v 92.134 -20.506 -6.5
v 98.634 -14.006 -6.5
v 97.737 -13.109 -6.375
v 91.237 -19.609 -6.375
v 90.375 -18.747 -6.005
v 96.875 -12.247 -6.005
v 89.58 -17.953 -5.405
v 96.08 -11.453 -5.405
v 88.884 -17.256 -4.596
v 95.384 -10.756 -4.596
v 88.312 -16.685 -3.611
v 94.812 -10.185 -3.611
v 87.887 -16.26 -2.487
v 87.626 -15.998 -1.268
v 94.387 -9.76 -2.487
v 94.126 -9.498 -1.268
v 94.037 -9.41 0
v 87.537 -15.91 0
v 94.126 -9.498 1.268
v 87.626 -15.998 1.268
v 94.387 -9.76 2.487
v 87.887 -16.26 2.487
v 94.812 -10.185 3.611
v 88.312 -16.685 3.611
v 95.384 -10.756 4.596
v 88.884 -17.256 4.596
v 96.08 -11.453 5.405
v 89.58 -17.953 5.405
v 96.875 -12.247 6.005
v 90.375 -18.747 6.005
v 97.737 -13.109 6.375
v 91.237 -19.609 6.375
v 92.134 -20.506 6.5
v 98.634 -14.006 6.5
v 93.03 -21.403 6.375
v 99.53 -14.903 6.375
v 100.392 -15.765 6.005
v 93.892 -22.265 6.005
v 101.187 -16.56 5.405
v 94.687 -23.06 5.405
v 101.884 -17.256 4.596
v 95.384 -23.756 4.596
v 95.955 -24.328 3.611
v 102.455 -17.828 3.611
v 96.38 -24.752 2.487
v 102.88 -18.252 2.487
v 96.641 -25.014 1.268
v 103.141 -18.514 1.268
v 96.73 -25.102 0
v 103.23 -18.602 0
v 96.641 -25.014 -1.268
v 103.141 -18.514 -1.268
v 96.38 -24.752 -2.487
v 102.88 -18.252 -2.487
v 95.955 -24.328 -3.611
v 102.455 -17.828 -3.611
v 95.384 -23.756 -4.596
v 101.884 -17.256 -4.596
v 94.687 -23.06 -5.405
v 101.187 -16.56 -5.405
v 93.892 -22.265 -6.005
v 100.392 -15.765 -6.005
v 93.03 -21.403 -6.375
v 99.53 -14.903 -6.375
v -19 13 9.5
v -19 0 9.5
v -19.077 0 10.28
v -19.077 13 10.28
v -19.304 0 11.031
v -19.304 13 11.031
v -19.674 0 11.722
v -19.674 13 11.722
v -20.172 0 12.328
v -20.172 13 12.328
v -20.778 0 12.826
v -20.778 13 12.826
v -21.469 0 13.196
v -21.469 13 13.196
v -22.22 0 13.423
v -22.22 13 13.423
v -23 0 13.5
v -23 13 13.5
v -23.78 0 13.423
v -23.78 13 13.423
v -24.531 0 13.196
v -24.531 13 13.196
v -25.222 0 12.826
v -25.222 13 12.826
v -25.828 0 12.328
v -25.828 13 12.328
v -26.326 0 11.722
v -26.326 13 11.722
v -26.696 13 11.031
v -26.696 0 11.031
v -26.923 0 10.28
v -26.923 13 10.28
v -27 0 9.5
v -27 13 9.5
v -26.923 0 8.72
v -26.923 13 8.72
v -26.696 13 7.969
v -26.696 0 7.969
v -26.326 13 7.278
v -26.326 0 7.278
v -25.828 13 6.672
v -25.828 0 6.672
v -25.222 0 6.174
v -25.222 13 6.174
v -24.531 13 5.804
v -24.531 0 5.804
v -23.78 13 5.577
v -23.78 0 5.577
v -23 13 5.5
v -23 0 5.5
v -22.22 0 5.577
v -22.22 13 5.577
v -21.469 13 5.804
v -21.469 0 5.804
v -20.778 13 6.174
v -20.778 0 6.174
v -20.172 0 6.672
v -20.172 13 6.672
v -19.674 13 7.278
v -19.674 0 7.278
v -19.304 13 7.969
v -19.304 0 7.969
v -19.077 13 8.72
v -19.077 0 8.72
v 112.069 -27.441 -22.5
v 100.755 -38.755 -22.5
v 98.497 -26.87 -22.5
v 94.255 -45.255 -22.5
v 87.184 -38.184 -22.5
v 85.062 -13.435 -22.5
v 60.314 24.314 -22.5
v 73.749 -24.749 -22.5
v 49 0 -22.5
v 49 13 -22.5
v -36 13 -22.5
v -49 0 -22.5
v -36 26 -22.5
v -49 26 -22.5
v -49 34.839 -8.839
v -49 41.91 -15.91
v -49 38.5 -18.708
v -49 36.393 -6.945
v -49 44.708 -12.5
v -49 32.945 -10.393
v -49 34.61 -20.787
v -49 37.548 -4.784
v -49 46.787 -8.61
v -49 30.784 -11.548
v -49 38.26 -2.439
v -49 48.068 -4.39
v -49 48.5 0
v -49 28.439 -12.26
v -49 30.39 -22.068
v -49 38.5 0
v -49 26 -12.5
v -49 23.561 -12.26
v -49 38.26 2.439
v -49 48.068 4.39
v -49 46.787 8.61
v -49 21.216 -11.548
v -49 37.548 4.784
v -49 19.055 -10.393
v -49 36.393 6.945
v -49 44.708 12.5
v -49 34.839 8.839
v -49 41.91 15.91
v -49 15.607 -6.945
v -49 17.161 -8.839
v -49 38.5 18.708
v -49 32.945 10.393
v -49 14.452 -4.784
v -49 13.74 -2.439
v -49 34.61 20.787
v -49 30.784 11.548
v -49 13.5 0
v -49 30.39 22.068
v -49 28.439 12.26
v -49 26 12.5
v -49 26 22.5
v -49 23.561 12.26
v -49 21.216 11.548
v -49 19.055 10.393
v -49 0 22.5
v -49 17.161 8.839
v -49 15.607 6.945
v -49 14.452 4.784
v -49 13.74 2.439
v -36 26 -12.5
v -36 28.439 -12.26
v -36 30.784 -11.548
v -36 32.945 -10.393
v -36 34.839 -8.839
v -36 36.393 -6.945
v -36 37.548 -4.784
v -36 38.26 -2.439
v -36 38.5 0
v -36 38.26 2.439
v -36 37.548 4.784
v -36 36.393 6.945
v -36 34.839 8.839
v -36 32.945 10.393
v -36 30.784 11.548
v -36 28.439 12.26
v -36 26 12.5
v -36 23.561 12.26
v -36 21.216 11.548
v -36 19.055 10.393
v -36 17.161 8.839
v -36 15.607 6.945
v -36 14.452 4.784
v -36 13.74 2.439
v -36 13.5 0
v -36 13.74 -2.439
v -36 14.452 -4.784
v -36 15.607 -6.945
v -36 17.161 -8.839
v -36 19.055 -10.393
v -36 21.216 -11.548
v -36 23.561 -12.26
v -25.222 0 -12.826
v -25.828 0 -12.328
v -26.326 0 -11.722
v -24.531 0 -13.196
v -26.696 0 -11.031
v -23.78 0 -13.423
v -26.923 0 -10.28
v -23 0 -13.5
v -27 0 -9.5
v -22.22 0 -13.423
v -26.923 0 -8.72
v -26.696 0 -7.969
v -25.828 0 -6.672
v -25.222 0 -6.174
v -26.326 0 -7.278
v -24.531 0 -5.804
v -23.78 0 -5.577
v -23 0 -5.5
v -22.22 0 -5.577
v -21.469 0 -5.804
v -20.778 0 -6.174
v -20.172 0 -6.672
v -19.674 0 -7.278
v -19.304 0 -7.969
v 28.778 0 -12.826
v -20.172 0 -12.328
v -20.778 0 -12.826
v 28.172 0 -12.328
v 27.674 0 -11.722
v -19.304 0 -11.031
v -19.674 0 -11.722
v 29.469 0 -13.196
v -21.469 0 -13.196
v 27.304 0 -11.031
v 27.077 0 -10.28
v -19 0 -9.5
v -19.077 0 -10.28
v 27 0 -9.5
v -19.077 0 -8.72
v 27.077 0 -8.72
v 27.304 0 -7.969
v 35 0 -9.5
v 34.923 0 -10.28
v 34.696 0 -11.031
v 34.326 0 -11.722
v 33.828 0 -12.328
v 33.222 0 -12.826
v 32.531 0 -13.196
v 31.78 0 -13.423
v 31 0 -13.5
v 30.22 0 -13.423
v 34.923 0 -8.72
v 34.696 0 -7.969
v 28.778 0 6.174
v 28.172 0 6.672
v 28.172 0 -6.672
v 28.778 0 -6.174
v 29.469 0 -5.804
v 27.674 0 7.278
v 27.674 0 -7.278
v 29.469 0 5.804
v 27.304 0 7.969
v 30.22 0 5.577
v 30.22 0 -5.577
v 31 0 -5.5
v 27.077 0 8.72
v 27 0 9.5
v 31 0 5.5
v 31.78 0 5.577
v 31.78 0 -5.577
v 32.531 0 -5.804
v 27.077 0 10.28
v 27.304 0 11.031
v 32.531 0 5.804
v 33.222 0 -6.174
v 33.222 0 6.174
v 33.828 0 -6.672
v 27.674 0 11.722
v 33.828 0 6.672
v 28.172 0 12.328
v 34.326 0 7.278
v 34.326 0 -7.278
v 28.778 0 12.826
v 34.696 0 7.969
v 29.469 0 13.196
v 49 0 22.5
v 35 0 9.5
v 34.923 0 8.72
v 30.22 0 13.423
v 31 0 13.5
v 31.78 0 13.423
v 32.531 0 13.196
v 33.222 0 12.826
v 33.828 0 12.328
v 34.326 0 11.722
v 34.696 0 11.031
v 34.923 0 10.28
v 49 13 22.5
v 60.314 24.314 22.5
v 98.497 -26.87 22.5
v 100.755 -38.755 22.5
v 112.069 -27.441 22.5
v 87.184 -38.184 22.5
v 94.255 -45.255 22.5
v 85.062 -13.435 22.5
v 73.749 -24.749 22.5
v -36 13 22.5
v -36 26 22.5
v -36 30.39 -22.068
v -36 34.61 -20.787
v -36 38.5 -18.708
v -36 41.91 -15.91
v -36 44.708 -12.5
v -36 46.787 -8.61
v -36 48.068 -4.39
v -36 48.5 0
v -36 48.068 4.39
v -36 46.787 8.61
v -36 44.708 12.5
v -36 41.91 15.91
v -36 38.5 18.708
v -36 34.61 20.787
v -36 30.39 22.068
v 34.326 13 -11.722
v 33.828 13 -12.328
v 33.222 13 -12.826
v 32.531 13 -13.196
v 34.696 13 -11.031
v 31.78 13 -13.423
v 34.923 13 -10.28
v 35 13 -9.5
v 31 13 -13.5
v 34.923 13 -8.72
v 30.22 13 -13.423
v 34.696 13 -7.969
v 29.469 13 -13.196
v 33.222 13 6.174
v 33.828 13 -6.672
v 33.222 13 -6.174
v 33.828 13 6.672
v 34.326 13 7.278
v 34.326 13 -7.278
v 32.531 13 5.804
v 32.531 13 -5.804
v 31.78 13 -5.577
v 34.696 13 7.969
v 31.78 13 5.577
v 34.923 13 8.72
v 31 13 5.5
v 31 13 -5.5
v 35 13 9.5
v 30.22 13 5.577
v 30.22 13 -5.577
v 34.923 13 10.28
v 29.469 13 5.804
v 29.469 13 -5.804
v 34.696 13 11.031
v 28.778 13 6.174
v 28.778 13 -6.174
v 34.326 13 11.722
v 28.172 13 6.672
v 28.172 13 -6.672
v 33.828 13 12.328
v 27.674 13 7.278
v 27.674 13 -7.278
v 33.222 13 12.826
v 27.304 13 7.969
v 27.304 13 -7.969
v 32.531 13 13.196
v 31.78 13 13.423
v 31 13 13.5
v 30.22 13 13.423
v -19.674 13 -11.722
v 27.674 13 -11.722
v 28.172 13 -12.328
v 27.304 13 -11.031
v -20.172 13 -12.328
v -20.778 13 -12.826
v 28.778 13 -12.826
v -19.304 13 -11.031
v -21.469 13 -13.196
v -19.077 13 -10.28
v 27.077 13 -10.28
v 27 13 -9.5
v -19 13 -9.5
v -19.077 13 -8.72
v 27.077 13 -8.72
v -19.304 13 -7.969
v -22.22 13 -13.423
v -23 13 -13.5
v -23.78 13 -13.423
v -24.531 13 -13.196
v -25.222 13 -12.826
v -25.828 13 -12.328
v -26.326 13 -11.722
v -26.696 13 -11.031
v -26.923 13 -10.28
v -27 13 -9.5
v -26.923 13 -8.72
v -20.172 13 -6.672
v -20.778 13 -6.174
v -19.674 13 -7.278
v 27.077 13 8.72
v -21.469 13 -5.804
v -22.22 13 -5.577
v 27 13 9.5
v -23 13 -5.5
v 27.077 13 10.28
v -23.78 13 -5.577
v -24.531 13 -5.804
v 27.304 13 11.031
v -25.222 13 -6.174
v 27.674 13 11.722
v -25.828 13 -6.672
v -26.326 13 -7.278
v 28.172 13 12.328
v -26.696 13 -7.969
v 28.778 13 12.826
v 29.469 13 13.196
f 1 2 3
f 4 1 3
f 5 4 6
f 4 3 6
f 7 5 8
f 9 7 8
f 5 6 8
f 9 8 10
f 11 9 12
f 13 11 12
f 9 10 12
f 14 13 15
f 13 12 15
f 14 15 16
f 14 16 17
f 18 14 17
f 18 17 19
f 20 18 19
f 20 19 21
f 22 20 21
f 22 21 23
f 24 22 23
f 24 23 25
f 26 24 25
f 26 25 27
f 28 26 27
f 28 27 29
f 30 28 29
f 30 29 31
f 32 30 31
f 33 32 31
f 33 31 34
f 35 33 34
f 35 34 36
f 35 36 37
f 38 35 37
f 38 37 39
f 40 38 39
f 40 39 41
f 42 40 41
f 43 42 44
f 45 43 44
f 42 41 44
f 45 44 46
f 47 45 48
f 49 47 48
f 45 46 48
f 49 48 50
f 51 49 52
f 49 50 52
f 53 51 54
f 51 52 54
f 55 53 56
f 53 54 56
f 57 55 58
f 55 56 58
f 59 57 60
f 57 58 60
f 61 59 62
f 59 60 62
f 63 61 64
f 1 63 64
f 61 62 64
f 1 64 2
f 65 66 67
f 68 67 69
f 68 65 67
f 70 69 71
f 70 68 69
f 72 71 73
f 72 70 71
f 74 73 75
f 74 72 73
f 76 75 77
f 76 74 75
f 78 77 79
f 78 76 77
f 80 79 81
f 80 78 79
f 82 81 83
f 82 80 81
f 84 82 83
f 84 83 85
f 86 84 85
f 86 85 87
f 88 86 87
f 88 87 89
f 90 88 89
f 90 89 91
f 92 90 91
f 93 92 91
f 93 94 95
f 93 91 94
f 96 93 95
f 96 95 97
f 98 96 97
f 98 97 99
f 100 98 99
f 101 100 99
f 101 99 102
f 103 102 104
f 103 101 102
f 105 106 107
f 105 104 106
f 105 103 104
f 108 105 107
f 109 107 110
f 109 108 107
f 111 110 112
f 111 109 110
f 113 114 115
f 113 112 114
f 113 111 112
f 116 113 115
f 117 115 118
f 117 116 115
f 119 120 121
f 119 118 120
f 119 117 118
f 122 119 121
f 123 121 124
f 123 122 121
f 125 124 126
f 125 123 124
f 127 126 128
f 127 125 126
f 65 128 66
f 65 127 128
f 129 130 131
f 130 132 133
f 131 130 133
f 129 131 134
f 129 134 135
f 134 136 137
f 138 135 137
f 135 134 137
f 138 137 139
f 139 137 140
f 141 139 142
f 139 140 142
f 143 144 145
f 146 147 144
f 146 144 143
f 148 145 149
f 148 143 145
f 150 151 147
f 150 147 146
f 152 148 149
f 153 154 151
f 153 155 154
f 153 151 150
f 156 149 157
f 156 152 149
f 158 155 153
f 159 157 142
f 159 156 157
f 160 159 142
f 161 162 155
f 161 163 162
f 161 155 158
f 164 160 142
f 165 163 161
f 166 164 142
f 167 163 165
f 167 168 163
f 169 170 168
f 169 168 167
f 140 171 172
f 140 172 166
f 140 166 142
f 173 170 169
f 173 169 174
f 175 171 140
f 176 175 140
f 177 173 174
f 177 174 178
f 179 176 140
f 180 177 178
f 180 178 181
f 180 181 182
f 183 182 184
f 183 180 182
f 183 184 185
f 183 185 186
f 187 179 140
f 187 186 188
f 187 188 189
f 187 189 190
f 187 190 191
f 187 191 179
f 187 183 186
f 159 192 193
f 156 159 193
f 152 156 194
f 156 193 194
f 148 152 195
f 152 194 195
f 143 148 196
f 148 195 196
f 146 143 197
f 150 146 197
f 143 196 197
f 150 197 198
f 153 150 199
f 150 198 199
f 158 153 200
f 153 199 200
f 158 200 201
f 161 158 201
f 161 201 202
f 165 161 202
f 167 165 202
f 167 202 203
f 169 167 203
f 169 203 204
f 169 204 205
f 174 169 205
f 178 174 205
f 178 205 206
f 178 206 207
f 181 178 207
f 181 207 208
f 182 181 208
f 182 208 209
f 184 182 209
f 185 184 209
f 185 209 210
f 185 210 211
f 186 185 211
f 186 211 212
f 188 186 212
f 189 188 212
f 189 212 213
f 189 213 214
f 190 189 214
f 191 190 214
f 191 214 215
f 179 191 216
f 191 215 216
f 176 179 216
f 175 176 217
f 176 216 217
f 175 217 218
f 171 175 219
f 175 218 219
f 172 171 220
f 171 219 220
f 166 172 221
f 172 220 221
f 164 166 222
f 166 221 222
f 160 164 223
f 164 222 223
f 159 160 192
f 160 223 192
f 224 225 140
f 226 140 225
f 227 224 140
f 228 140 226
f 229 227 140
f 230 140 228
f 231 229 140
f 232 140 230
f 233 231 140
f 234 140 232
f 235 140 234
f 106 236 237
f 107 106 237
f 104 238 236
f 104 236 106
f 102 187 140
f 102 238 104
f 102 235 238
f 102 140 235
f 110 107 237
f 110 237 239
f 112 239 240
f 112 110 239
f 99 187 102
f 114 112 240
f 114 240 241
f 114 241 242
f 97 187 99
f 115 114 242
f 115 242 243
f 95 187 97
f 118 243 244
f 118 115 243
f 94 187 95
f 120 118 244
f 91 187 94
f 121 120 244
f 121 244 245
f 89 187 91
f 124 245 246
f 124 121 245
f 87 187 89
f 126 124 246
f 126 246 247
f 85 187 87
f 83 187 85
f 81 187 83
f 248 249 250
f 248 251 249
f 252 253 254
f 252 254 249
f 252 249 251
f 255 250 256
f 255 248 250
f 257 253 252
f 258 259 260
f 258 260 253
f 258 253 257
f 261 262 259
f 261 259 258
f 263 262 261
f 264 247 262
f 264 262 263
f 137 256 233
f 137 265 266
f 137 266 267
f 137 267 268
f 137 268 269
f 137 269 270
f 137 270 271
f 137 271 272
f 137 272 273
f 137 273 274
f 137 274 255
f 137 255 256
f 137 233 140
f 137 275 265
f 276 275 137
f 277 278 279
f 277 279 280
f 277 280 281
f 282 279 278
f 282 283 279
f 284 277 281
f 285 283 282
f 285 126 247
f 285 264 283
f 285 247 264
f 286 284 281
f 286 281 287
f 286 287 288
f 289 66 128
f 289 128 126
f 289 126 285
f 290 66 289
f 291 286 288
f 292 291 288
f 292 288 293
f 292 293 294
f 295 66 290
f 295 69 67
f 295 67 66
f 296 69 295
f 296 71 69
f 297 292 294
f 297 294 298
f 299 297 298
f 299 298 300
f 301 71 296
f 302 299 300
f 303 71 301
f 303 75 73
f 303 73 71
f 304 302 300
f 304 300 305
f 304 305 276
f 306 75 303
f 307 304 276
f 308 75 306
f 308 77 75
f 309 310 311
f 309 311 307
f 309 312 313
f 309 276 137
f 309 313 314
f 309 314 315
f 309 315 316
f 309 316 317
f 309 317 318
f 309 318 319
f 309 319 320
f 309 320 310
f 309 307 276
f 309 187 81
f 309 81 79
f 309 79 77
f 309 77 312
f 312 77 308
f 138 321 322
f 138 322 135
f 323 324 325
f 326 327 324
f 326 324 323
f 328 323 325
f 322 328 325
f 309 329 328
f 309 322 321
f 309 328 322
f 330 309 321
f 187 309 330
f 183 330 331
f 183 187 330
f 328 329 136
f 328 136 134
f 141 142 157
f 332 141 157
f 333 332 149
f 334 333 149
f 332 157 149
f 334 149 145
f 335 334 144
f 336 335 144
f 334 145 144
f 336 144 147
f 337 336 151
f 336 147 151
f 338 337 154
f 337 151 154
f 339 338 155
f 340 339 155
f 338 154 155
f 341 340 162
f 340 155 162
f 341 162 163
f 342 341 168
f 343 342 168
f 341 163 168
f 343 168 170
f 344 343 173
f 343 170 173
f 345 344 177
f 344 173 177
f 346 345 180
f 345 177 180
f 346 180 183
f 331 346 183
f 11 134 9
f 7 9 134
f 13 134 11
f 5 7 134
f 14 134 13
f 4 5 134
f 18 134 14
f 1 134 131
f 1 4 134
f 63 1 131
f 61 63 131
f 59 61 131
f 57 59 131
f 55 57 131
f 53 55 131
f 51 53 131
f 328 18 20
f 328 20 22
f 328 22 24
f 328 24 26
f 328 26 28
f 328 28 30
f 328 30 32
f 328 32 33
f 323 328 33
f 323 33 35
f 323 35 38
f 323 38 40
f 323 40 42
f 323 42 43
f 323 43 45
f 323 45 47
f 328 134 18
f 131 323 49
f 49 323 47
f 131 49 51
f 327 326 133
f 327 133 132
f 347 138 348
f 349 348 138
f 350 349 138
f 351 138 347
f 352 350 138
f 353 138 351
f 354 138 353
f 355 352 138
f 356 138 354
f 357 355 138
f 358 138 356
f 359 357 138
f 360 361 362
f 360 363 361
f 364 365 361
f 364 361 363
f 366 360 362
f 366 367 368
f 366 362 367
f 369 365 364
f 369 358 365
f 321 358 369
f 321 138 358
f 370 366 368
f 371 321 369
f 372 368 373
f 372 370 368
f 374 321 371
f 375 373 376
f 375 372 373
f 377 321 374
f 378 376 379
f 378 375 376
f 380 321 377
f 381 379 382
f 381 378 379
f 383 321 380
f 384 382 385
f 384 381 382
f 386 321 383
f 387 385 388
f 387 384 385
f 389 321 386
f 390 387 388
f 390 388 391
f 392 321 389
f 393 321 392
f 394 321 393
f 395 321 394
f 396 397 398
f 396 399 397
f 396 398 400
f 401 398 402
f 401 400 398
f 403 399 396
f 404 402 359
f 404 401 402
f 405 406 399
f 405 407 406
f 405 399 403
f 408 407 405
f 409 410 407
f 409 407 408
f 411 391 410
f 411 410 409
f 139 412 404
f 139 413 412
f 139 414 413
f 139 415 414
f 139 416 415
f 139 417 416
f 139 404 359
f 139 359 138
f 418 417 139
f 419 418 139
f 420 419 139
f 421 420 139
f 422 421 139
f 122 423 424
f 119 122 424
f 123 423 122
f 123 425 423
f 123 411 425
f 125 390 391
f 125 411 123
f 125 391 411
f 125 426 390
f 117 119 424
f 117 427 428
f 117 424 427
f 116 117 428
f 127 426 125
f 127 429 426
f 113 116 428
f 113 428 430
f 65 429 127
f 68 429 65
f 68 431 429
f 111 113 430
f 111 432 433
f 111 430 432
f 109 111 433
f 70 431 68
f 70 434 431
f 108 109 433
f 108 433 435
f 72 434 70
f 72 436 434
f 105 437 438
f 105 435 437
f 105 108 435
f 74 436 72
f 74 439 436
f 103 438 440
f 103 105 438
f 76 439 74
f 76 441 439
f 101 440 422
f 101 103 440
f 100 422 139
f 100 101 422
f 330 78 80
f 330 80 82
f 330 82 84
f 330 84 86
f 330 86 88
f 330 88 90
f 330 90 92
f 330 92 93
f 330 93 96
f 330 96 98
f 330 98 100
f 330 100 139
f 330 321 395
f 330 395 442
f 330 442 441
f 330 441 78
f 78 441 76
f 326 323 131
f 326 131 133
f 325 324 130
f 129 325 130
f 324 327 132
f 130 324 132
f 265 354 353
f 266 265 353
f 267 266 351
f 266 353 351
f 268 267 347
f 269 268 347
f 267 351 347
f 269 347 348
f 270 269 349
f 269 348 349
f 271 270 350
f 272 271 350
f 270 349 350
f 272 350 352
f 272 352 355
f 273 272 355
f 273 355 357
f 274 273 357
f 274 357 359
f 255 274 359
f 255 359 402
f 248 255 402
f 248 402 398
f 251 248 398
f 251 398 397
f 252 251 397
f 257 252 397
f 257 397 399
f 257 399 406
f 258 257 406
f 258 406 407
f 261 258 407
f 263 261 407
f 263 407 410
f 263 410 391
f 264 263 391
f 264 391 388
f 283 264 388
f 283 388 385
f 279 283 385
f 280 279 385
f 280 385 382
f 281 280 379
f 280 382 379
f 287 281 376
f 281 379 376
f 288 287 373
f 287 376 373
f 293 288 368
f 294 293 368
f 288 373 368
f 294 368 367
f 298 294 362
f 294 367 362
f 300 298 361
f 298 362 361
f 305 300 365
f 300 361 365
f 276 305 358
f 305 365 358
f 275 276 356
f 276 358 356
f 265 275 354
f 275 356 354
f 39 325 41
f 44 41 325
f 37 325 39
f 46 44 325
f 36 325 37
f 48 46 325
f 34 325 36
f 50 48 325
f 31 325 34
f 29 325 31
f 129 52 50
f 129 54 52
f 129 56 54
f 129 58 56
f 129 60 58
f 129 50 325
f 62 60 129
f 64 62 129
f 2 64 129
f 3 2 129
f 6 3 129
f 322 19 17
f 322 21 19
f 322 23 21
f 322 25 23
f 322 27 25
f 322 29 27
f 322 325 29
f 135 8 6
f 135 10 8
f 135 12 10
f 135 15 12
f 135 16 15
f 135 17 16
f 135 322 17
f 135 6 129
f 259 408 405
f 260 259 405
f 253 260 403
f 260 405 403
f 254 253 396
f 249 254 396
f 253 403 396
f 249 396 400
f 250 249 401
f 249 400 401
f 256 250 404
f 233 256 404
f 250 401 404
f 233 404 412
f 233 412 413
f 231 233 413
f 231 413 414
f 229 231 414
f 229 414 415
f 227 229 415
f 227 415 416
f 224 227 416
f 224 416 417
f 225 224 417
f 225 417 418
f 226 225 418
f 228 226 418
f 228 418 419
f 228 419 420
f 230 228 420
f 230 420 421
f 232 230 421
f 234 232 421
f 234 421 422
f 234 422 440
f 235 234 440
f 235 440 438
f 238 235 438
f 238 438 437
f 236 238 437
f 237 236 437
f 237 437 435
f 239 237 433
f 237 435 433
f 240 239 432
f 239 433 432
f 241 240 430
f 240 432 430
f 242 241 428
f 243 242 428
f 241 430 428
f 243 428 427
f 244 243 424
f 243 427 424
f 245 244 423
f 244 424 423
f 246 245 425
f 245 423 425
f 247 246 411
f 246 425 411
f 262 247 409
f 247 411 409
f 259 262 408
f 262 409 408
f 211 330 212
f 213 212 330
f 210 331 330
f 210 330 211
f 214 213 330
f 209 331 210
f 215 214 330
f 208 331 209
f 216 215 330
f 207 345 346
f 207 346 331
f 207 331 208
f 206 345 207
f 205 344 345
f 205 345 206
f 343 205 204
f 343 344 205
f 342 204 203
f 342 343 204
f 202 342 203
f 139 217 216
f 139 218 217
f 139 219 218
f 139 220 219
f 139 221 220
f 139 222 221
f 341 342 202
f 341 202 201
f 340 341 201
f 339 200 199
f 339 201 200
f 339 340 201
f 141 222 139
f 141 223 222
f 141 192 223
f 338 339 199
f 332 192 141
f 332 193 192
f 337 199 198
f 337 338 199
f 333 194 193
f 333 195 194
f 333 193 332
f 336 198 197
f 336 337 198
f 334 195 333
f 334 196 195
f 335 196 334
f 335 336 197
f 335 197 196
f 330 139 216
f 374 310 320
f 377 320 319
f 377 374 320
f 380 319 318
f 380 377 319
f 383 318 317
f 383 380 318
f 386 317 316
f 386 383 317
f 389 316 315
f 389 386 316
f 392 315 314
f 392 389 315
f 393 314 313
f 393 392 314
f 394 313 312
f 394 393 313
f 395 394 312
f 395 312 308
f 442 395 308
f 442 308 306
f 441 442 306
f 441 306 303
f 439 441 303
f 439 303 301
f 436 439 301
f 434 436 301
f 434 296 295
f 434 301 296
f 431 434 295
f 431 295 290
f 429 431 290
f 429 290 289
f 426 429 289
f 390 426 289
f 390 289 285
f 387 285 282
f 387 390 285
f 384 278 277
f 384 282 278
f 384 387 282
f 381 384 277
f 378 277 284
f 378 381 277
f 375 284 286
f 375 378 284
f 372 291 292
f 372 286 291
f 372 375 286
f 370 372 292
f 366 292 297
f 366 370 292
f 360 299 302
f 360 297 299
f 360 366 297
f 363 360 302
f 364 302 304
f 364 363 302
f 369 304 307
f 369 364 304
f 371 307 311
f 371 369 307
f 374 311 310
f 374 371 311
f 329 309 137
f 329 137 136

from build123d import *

# Parameters (mm, degrees)
ESTRUSIONE_ESTRUSIONE1_DEPTH  = 22.5
SCHIZZO2_W                    = 45
SCHIZZO2_H                    = 73.192388155
ESTRUSIONE_ESTRUSIONE2_DEPTH  = 16
ESTRUSIONE_ESTRUSIONE3_DEPTH  = 13
TAGLIO_ESTRUSIONE1_DEPTH      = 1
TAGLIO_ESTRUSIONE1_DEPTH_BACK = 46
SCHIZZO5_R                    = 12.5
TAGLIO_ESTRUSIONE2_DEPTH      = 14
SCHIZZO6_R                    = 6.5
TAGLIO_ESTRUSIONE3_DEPTH      = 127.488852712
SCHIZZO7_R                    = 4
TAGLIO_ESTRUSIONE4_DEPTH      = 59.254833996


with BuildPart() as part:
    # Schizzo1 → Estrusione-Estrusione1 (new body, symmetric)
    with BuildSketch(Plane.XY):
        Polygon((-49, 13), (-49, 0), (49, 0), (94.254833996, -45.254833996), (100.754833996, -38.754833996), (49, 13), align=None)
    extrude(amount=ESTRUSIONE_ESTRUSIONE1_DEPTH, both=True)

    # Schizzo2 → Estrusione-Estrusione2 (add)
    with BuildSketch(Plane(origin=(31, 31, 0), x_dir=(0, 0, -1), z_dir=(0.707106781, 0.707106781, 0))):
        with Locations((0, -62.052038201)):
            Rectangle(SCHIZZO2_W, SCHIZZO2_H)
    extrude(amount=ESTRUSIONE_ESTRUSIONE2_DEPTH)

    # Schizzo3 → Estrusione-Estrusione3 (add)
    with BuildSketch(Plane.ZY.offset(49)):
        with BuildLine():
            Line((-22.5, 0), (-22.5, 26))
            ThreePointArc((-22.5, 26), (0, 48.5), (22.5, 26))
            Line((22.5, 26), (22.5, 0))
            Line((22.5, 0), (-22.5, 0))
        make_face()
    extrude(amount=-ESTRUSIONE_ESTRUSIONE3_DEPTH)

    # Schizzo4 → Taglio-Estrusione1 (cut, two sides)
    with BuildSketch(Plane.XY.offset(22.5)) as taglio_estrusione1_sk:
        Polygon((73.748737342, -24.748737342), (85.062445841, -13.435028843), (98.497474683, -26.870057685), (87.183766184, -38.183766184), align=None)
    extrude(amount=TAGLIO_ESTRUSIONE1_DEPTH, mode=Mode.SUBTRACT)
    extrude(taglio_estrusione1_sk.sketch, amount=-TAGLIO_ESTRUSIONE1_DEPTH_BACK, mode=Mode.SUBTRACT)

    # Schizzo5 → Taglio-Estrusione2 (cut, through all)
    with BuildSketch(Plane(origin=(-36, 0, 0), x_dir=(0, 0, -1), z_dir=(1, 0, 0))):
        with Locations((0, 26)):
            Circle(SCHIZZO5_R)
    extrude(amount=-TAGLIO_ESTRUSIONE2_DEPTH, mode=Mode.SUBTRACT)

    # Schizzo6 → Taglio-Estrusione3 (cut, through all)
    with BuildSketch(Plane(origin=(42.313708499, 42.313708499, 0), x_dir=(0, 0, -1), z_dir=(0.707106781, 0.707106781, 0))):
        with Locations((0, -79.648232278)):
            Circle(SCHIZZO6_R)
    extrude(amount=-TAGLIO_ESTRUSIONE3_DEPTH, mode=Mode.SUBTRACT)

    # Schizzo7 → Taglio-Estrusione4 (cut, through all)
    with BuildSketch(Plane(origin=(0, 13, 0), x_dir=(1, 0, 0), z_dir=(0, 1, 0))):
        with Locations((-23, 9.5)):
            Circle(SCHIZZO7_R)
        with Locations((31, 9.5)):
            Circle(SCHIZZO7_R)
    taglio_estrusione4 = extrude(amount=-TAGLIO_ESTRUSIONE4_DEPTH, mode=Mode.SUBTRACT)

    # Specchia1: Taglio-Estrusione4 across plane
    add(taglio_estrusione4.mirror(Plane.XY), mode=Mode.SUBTRACT)


solid = part.part
